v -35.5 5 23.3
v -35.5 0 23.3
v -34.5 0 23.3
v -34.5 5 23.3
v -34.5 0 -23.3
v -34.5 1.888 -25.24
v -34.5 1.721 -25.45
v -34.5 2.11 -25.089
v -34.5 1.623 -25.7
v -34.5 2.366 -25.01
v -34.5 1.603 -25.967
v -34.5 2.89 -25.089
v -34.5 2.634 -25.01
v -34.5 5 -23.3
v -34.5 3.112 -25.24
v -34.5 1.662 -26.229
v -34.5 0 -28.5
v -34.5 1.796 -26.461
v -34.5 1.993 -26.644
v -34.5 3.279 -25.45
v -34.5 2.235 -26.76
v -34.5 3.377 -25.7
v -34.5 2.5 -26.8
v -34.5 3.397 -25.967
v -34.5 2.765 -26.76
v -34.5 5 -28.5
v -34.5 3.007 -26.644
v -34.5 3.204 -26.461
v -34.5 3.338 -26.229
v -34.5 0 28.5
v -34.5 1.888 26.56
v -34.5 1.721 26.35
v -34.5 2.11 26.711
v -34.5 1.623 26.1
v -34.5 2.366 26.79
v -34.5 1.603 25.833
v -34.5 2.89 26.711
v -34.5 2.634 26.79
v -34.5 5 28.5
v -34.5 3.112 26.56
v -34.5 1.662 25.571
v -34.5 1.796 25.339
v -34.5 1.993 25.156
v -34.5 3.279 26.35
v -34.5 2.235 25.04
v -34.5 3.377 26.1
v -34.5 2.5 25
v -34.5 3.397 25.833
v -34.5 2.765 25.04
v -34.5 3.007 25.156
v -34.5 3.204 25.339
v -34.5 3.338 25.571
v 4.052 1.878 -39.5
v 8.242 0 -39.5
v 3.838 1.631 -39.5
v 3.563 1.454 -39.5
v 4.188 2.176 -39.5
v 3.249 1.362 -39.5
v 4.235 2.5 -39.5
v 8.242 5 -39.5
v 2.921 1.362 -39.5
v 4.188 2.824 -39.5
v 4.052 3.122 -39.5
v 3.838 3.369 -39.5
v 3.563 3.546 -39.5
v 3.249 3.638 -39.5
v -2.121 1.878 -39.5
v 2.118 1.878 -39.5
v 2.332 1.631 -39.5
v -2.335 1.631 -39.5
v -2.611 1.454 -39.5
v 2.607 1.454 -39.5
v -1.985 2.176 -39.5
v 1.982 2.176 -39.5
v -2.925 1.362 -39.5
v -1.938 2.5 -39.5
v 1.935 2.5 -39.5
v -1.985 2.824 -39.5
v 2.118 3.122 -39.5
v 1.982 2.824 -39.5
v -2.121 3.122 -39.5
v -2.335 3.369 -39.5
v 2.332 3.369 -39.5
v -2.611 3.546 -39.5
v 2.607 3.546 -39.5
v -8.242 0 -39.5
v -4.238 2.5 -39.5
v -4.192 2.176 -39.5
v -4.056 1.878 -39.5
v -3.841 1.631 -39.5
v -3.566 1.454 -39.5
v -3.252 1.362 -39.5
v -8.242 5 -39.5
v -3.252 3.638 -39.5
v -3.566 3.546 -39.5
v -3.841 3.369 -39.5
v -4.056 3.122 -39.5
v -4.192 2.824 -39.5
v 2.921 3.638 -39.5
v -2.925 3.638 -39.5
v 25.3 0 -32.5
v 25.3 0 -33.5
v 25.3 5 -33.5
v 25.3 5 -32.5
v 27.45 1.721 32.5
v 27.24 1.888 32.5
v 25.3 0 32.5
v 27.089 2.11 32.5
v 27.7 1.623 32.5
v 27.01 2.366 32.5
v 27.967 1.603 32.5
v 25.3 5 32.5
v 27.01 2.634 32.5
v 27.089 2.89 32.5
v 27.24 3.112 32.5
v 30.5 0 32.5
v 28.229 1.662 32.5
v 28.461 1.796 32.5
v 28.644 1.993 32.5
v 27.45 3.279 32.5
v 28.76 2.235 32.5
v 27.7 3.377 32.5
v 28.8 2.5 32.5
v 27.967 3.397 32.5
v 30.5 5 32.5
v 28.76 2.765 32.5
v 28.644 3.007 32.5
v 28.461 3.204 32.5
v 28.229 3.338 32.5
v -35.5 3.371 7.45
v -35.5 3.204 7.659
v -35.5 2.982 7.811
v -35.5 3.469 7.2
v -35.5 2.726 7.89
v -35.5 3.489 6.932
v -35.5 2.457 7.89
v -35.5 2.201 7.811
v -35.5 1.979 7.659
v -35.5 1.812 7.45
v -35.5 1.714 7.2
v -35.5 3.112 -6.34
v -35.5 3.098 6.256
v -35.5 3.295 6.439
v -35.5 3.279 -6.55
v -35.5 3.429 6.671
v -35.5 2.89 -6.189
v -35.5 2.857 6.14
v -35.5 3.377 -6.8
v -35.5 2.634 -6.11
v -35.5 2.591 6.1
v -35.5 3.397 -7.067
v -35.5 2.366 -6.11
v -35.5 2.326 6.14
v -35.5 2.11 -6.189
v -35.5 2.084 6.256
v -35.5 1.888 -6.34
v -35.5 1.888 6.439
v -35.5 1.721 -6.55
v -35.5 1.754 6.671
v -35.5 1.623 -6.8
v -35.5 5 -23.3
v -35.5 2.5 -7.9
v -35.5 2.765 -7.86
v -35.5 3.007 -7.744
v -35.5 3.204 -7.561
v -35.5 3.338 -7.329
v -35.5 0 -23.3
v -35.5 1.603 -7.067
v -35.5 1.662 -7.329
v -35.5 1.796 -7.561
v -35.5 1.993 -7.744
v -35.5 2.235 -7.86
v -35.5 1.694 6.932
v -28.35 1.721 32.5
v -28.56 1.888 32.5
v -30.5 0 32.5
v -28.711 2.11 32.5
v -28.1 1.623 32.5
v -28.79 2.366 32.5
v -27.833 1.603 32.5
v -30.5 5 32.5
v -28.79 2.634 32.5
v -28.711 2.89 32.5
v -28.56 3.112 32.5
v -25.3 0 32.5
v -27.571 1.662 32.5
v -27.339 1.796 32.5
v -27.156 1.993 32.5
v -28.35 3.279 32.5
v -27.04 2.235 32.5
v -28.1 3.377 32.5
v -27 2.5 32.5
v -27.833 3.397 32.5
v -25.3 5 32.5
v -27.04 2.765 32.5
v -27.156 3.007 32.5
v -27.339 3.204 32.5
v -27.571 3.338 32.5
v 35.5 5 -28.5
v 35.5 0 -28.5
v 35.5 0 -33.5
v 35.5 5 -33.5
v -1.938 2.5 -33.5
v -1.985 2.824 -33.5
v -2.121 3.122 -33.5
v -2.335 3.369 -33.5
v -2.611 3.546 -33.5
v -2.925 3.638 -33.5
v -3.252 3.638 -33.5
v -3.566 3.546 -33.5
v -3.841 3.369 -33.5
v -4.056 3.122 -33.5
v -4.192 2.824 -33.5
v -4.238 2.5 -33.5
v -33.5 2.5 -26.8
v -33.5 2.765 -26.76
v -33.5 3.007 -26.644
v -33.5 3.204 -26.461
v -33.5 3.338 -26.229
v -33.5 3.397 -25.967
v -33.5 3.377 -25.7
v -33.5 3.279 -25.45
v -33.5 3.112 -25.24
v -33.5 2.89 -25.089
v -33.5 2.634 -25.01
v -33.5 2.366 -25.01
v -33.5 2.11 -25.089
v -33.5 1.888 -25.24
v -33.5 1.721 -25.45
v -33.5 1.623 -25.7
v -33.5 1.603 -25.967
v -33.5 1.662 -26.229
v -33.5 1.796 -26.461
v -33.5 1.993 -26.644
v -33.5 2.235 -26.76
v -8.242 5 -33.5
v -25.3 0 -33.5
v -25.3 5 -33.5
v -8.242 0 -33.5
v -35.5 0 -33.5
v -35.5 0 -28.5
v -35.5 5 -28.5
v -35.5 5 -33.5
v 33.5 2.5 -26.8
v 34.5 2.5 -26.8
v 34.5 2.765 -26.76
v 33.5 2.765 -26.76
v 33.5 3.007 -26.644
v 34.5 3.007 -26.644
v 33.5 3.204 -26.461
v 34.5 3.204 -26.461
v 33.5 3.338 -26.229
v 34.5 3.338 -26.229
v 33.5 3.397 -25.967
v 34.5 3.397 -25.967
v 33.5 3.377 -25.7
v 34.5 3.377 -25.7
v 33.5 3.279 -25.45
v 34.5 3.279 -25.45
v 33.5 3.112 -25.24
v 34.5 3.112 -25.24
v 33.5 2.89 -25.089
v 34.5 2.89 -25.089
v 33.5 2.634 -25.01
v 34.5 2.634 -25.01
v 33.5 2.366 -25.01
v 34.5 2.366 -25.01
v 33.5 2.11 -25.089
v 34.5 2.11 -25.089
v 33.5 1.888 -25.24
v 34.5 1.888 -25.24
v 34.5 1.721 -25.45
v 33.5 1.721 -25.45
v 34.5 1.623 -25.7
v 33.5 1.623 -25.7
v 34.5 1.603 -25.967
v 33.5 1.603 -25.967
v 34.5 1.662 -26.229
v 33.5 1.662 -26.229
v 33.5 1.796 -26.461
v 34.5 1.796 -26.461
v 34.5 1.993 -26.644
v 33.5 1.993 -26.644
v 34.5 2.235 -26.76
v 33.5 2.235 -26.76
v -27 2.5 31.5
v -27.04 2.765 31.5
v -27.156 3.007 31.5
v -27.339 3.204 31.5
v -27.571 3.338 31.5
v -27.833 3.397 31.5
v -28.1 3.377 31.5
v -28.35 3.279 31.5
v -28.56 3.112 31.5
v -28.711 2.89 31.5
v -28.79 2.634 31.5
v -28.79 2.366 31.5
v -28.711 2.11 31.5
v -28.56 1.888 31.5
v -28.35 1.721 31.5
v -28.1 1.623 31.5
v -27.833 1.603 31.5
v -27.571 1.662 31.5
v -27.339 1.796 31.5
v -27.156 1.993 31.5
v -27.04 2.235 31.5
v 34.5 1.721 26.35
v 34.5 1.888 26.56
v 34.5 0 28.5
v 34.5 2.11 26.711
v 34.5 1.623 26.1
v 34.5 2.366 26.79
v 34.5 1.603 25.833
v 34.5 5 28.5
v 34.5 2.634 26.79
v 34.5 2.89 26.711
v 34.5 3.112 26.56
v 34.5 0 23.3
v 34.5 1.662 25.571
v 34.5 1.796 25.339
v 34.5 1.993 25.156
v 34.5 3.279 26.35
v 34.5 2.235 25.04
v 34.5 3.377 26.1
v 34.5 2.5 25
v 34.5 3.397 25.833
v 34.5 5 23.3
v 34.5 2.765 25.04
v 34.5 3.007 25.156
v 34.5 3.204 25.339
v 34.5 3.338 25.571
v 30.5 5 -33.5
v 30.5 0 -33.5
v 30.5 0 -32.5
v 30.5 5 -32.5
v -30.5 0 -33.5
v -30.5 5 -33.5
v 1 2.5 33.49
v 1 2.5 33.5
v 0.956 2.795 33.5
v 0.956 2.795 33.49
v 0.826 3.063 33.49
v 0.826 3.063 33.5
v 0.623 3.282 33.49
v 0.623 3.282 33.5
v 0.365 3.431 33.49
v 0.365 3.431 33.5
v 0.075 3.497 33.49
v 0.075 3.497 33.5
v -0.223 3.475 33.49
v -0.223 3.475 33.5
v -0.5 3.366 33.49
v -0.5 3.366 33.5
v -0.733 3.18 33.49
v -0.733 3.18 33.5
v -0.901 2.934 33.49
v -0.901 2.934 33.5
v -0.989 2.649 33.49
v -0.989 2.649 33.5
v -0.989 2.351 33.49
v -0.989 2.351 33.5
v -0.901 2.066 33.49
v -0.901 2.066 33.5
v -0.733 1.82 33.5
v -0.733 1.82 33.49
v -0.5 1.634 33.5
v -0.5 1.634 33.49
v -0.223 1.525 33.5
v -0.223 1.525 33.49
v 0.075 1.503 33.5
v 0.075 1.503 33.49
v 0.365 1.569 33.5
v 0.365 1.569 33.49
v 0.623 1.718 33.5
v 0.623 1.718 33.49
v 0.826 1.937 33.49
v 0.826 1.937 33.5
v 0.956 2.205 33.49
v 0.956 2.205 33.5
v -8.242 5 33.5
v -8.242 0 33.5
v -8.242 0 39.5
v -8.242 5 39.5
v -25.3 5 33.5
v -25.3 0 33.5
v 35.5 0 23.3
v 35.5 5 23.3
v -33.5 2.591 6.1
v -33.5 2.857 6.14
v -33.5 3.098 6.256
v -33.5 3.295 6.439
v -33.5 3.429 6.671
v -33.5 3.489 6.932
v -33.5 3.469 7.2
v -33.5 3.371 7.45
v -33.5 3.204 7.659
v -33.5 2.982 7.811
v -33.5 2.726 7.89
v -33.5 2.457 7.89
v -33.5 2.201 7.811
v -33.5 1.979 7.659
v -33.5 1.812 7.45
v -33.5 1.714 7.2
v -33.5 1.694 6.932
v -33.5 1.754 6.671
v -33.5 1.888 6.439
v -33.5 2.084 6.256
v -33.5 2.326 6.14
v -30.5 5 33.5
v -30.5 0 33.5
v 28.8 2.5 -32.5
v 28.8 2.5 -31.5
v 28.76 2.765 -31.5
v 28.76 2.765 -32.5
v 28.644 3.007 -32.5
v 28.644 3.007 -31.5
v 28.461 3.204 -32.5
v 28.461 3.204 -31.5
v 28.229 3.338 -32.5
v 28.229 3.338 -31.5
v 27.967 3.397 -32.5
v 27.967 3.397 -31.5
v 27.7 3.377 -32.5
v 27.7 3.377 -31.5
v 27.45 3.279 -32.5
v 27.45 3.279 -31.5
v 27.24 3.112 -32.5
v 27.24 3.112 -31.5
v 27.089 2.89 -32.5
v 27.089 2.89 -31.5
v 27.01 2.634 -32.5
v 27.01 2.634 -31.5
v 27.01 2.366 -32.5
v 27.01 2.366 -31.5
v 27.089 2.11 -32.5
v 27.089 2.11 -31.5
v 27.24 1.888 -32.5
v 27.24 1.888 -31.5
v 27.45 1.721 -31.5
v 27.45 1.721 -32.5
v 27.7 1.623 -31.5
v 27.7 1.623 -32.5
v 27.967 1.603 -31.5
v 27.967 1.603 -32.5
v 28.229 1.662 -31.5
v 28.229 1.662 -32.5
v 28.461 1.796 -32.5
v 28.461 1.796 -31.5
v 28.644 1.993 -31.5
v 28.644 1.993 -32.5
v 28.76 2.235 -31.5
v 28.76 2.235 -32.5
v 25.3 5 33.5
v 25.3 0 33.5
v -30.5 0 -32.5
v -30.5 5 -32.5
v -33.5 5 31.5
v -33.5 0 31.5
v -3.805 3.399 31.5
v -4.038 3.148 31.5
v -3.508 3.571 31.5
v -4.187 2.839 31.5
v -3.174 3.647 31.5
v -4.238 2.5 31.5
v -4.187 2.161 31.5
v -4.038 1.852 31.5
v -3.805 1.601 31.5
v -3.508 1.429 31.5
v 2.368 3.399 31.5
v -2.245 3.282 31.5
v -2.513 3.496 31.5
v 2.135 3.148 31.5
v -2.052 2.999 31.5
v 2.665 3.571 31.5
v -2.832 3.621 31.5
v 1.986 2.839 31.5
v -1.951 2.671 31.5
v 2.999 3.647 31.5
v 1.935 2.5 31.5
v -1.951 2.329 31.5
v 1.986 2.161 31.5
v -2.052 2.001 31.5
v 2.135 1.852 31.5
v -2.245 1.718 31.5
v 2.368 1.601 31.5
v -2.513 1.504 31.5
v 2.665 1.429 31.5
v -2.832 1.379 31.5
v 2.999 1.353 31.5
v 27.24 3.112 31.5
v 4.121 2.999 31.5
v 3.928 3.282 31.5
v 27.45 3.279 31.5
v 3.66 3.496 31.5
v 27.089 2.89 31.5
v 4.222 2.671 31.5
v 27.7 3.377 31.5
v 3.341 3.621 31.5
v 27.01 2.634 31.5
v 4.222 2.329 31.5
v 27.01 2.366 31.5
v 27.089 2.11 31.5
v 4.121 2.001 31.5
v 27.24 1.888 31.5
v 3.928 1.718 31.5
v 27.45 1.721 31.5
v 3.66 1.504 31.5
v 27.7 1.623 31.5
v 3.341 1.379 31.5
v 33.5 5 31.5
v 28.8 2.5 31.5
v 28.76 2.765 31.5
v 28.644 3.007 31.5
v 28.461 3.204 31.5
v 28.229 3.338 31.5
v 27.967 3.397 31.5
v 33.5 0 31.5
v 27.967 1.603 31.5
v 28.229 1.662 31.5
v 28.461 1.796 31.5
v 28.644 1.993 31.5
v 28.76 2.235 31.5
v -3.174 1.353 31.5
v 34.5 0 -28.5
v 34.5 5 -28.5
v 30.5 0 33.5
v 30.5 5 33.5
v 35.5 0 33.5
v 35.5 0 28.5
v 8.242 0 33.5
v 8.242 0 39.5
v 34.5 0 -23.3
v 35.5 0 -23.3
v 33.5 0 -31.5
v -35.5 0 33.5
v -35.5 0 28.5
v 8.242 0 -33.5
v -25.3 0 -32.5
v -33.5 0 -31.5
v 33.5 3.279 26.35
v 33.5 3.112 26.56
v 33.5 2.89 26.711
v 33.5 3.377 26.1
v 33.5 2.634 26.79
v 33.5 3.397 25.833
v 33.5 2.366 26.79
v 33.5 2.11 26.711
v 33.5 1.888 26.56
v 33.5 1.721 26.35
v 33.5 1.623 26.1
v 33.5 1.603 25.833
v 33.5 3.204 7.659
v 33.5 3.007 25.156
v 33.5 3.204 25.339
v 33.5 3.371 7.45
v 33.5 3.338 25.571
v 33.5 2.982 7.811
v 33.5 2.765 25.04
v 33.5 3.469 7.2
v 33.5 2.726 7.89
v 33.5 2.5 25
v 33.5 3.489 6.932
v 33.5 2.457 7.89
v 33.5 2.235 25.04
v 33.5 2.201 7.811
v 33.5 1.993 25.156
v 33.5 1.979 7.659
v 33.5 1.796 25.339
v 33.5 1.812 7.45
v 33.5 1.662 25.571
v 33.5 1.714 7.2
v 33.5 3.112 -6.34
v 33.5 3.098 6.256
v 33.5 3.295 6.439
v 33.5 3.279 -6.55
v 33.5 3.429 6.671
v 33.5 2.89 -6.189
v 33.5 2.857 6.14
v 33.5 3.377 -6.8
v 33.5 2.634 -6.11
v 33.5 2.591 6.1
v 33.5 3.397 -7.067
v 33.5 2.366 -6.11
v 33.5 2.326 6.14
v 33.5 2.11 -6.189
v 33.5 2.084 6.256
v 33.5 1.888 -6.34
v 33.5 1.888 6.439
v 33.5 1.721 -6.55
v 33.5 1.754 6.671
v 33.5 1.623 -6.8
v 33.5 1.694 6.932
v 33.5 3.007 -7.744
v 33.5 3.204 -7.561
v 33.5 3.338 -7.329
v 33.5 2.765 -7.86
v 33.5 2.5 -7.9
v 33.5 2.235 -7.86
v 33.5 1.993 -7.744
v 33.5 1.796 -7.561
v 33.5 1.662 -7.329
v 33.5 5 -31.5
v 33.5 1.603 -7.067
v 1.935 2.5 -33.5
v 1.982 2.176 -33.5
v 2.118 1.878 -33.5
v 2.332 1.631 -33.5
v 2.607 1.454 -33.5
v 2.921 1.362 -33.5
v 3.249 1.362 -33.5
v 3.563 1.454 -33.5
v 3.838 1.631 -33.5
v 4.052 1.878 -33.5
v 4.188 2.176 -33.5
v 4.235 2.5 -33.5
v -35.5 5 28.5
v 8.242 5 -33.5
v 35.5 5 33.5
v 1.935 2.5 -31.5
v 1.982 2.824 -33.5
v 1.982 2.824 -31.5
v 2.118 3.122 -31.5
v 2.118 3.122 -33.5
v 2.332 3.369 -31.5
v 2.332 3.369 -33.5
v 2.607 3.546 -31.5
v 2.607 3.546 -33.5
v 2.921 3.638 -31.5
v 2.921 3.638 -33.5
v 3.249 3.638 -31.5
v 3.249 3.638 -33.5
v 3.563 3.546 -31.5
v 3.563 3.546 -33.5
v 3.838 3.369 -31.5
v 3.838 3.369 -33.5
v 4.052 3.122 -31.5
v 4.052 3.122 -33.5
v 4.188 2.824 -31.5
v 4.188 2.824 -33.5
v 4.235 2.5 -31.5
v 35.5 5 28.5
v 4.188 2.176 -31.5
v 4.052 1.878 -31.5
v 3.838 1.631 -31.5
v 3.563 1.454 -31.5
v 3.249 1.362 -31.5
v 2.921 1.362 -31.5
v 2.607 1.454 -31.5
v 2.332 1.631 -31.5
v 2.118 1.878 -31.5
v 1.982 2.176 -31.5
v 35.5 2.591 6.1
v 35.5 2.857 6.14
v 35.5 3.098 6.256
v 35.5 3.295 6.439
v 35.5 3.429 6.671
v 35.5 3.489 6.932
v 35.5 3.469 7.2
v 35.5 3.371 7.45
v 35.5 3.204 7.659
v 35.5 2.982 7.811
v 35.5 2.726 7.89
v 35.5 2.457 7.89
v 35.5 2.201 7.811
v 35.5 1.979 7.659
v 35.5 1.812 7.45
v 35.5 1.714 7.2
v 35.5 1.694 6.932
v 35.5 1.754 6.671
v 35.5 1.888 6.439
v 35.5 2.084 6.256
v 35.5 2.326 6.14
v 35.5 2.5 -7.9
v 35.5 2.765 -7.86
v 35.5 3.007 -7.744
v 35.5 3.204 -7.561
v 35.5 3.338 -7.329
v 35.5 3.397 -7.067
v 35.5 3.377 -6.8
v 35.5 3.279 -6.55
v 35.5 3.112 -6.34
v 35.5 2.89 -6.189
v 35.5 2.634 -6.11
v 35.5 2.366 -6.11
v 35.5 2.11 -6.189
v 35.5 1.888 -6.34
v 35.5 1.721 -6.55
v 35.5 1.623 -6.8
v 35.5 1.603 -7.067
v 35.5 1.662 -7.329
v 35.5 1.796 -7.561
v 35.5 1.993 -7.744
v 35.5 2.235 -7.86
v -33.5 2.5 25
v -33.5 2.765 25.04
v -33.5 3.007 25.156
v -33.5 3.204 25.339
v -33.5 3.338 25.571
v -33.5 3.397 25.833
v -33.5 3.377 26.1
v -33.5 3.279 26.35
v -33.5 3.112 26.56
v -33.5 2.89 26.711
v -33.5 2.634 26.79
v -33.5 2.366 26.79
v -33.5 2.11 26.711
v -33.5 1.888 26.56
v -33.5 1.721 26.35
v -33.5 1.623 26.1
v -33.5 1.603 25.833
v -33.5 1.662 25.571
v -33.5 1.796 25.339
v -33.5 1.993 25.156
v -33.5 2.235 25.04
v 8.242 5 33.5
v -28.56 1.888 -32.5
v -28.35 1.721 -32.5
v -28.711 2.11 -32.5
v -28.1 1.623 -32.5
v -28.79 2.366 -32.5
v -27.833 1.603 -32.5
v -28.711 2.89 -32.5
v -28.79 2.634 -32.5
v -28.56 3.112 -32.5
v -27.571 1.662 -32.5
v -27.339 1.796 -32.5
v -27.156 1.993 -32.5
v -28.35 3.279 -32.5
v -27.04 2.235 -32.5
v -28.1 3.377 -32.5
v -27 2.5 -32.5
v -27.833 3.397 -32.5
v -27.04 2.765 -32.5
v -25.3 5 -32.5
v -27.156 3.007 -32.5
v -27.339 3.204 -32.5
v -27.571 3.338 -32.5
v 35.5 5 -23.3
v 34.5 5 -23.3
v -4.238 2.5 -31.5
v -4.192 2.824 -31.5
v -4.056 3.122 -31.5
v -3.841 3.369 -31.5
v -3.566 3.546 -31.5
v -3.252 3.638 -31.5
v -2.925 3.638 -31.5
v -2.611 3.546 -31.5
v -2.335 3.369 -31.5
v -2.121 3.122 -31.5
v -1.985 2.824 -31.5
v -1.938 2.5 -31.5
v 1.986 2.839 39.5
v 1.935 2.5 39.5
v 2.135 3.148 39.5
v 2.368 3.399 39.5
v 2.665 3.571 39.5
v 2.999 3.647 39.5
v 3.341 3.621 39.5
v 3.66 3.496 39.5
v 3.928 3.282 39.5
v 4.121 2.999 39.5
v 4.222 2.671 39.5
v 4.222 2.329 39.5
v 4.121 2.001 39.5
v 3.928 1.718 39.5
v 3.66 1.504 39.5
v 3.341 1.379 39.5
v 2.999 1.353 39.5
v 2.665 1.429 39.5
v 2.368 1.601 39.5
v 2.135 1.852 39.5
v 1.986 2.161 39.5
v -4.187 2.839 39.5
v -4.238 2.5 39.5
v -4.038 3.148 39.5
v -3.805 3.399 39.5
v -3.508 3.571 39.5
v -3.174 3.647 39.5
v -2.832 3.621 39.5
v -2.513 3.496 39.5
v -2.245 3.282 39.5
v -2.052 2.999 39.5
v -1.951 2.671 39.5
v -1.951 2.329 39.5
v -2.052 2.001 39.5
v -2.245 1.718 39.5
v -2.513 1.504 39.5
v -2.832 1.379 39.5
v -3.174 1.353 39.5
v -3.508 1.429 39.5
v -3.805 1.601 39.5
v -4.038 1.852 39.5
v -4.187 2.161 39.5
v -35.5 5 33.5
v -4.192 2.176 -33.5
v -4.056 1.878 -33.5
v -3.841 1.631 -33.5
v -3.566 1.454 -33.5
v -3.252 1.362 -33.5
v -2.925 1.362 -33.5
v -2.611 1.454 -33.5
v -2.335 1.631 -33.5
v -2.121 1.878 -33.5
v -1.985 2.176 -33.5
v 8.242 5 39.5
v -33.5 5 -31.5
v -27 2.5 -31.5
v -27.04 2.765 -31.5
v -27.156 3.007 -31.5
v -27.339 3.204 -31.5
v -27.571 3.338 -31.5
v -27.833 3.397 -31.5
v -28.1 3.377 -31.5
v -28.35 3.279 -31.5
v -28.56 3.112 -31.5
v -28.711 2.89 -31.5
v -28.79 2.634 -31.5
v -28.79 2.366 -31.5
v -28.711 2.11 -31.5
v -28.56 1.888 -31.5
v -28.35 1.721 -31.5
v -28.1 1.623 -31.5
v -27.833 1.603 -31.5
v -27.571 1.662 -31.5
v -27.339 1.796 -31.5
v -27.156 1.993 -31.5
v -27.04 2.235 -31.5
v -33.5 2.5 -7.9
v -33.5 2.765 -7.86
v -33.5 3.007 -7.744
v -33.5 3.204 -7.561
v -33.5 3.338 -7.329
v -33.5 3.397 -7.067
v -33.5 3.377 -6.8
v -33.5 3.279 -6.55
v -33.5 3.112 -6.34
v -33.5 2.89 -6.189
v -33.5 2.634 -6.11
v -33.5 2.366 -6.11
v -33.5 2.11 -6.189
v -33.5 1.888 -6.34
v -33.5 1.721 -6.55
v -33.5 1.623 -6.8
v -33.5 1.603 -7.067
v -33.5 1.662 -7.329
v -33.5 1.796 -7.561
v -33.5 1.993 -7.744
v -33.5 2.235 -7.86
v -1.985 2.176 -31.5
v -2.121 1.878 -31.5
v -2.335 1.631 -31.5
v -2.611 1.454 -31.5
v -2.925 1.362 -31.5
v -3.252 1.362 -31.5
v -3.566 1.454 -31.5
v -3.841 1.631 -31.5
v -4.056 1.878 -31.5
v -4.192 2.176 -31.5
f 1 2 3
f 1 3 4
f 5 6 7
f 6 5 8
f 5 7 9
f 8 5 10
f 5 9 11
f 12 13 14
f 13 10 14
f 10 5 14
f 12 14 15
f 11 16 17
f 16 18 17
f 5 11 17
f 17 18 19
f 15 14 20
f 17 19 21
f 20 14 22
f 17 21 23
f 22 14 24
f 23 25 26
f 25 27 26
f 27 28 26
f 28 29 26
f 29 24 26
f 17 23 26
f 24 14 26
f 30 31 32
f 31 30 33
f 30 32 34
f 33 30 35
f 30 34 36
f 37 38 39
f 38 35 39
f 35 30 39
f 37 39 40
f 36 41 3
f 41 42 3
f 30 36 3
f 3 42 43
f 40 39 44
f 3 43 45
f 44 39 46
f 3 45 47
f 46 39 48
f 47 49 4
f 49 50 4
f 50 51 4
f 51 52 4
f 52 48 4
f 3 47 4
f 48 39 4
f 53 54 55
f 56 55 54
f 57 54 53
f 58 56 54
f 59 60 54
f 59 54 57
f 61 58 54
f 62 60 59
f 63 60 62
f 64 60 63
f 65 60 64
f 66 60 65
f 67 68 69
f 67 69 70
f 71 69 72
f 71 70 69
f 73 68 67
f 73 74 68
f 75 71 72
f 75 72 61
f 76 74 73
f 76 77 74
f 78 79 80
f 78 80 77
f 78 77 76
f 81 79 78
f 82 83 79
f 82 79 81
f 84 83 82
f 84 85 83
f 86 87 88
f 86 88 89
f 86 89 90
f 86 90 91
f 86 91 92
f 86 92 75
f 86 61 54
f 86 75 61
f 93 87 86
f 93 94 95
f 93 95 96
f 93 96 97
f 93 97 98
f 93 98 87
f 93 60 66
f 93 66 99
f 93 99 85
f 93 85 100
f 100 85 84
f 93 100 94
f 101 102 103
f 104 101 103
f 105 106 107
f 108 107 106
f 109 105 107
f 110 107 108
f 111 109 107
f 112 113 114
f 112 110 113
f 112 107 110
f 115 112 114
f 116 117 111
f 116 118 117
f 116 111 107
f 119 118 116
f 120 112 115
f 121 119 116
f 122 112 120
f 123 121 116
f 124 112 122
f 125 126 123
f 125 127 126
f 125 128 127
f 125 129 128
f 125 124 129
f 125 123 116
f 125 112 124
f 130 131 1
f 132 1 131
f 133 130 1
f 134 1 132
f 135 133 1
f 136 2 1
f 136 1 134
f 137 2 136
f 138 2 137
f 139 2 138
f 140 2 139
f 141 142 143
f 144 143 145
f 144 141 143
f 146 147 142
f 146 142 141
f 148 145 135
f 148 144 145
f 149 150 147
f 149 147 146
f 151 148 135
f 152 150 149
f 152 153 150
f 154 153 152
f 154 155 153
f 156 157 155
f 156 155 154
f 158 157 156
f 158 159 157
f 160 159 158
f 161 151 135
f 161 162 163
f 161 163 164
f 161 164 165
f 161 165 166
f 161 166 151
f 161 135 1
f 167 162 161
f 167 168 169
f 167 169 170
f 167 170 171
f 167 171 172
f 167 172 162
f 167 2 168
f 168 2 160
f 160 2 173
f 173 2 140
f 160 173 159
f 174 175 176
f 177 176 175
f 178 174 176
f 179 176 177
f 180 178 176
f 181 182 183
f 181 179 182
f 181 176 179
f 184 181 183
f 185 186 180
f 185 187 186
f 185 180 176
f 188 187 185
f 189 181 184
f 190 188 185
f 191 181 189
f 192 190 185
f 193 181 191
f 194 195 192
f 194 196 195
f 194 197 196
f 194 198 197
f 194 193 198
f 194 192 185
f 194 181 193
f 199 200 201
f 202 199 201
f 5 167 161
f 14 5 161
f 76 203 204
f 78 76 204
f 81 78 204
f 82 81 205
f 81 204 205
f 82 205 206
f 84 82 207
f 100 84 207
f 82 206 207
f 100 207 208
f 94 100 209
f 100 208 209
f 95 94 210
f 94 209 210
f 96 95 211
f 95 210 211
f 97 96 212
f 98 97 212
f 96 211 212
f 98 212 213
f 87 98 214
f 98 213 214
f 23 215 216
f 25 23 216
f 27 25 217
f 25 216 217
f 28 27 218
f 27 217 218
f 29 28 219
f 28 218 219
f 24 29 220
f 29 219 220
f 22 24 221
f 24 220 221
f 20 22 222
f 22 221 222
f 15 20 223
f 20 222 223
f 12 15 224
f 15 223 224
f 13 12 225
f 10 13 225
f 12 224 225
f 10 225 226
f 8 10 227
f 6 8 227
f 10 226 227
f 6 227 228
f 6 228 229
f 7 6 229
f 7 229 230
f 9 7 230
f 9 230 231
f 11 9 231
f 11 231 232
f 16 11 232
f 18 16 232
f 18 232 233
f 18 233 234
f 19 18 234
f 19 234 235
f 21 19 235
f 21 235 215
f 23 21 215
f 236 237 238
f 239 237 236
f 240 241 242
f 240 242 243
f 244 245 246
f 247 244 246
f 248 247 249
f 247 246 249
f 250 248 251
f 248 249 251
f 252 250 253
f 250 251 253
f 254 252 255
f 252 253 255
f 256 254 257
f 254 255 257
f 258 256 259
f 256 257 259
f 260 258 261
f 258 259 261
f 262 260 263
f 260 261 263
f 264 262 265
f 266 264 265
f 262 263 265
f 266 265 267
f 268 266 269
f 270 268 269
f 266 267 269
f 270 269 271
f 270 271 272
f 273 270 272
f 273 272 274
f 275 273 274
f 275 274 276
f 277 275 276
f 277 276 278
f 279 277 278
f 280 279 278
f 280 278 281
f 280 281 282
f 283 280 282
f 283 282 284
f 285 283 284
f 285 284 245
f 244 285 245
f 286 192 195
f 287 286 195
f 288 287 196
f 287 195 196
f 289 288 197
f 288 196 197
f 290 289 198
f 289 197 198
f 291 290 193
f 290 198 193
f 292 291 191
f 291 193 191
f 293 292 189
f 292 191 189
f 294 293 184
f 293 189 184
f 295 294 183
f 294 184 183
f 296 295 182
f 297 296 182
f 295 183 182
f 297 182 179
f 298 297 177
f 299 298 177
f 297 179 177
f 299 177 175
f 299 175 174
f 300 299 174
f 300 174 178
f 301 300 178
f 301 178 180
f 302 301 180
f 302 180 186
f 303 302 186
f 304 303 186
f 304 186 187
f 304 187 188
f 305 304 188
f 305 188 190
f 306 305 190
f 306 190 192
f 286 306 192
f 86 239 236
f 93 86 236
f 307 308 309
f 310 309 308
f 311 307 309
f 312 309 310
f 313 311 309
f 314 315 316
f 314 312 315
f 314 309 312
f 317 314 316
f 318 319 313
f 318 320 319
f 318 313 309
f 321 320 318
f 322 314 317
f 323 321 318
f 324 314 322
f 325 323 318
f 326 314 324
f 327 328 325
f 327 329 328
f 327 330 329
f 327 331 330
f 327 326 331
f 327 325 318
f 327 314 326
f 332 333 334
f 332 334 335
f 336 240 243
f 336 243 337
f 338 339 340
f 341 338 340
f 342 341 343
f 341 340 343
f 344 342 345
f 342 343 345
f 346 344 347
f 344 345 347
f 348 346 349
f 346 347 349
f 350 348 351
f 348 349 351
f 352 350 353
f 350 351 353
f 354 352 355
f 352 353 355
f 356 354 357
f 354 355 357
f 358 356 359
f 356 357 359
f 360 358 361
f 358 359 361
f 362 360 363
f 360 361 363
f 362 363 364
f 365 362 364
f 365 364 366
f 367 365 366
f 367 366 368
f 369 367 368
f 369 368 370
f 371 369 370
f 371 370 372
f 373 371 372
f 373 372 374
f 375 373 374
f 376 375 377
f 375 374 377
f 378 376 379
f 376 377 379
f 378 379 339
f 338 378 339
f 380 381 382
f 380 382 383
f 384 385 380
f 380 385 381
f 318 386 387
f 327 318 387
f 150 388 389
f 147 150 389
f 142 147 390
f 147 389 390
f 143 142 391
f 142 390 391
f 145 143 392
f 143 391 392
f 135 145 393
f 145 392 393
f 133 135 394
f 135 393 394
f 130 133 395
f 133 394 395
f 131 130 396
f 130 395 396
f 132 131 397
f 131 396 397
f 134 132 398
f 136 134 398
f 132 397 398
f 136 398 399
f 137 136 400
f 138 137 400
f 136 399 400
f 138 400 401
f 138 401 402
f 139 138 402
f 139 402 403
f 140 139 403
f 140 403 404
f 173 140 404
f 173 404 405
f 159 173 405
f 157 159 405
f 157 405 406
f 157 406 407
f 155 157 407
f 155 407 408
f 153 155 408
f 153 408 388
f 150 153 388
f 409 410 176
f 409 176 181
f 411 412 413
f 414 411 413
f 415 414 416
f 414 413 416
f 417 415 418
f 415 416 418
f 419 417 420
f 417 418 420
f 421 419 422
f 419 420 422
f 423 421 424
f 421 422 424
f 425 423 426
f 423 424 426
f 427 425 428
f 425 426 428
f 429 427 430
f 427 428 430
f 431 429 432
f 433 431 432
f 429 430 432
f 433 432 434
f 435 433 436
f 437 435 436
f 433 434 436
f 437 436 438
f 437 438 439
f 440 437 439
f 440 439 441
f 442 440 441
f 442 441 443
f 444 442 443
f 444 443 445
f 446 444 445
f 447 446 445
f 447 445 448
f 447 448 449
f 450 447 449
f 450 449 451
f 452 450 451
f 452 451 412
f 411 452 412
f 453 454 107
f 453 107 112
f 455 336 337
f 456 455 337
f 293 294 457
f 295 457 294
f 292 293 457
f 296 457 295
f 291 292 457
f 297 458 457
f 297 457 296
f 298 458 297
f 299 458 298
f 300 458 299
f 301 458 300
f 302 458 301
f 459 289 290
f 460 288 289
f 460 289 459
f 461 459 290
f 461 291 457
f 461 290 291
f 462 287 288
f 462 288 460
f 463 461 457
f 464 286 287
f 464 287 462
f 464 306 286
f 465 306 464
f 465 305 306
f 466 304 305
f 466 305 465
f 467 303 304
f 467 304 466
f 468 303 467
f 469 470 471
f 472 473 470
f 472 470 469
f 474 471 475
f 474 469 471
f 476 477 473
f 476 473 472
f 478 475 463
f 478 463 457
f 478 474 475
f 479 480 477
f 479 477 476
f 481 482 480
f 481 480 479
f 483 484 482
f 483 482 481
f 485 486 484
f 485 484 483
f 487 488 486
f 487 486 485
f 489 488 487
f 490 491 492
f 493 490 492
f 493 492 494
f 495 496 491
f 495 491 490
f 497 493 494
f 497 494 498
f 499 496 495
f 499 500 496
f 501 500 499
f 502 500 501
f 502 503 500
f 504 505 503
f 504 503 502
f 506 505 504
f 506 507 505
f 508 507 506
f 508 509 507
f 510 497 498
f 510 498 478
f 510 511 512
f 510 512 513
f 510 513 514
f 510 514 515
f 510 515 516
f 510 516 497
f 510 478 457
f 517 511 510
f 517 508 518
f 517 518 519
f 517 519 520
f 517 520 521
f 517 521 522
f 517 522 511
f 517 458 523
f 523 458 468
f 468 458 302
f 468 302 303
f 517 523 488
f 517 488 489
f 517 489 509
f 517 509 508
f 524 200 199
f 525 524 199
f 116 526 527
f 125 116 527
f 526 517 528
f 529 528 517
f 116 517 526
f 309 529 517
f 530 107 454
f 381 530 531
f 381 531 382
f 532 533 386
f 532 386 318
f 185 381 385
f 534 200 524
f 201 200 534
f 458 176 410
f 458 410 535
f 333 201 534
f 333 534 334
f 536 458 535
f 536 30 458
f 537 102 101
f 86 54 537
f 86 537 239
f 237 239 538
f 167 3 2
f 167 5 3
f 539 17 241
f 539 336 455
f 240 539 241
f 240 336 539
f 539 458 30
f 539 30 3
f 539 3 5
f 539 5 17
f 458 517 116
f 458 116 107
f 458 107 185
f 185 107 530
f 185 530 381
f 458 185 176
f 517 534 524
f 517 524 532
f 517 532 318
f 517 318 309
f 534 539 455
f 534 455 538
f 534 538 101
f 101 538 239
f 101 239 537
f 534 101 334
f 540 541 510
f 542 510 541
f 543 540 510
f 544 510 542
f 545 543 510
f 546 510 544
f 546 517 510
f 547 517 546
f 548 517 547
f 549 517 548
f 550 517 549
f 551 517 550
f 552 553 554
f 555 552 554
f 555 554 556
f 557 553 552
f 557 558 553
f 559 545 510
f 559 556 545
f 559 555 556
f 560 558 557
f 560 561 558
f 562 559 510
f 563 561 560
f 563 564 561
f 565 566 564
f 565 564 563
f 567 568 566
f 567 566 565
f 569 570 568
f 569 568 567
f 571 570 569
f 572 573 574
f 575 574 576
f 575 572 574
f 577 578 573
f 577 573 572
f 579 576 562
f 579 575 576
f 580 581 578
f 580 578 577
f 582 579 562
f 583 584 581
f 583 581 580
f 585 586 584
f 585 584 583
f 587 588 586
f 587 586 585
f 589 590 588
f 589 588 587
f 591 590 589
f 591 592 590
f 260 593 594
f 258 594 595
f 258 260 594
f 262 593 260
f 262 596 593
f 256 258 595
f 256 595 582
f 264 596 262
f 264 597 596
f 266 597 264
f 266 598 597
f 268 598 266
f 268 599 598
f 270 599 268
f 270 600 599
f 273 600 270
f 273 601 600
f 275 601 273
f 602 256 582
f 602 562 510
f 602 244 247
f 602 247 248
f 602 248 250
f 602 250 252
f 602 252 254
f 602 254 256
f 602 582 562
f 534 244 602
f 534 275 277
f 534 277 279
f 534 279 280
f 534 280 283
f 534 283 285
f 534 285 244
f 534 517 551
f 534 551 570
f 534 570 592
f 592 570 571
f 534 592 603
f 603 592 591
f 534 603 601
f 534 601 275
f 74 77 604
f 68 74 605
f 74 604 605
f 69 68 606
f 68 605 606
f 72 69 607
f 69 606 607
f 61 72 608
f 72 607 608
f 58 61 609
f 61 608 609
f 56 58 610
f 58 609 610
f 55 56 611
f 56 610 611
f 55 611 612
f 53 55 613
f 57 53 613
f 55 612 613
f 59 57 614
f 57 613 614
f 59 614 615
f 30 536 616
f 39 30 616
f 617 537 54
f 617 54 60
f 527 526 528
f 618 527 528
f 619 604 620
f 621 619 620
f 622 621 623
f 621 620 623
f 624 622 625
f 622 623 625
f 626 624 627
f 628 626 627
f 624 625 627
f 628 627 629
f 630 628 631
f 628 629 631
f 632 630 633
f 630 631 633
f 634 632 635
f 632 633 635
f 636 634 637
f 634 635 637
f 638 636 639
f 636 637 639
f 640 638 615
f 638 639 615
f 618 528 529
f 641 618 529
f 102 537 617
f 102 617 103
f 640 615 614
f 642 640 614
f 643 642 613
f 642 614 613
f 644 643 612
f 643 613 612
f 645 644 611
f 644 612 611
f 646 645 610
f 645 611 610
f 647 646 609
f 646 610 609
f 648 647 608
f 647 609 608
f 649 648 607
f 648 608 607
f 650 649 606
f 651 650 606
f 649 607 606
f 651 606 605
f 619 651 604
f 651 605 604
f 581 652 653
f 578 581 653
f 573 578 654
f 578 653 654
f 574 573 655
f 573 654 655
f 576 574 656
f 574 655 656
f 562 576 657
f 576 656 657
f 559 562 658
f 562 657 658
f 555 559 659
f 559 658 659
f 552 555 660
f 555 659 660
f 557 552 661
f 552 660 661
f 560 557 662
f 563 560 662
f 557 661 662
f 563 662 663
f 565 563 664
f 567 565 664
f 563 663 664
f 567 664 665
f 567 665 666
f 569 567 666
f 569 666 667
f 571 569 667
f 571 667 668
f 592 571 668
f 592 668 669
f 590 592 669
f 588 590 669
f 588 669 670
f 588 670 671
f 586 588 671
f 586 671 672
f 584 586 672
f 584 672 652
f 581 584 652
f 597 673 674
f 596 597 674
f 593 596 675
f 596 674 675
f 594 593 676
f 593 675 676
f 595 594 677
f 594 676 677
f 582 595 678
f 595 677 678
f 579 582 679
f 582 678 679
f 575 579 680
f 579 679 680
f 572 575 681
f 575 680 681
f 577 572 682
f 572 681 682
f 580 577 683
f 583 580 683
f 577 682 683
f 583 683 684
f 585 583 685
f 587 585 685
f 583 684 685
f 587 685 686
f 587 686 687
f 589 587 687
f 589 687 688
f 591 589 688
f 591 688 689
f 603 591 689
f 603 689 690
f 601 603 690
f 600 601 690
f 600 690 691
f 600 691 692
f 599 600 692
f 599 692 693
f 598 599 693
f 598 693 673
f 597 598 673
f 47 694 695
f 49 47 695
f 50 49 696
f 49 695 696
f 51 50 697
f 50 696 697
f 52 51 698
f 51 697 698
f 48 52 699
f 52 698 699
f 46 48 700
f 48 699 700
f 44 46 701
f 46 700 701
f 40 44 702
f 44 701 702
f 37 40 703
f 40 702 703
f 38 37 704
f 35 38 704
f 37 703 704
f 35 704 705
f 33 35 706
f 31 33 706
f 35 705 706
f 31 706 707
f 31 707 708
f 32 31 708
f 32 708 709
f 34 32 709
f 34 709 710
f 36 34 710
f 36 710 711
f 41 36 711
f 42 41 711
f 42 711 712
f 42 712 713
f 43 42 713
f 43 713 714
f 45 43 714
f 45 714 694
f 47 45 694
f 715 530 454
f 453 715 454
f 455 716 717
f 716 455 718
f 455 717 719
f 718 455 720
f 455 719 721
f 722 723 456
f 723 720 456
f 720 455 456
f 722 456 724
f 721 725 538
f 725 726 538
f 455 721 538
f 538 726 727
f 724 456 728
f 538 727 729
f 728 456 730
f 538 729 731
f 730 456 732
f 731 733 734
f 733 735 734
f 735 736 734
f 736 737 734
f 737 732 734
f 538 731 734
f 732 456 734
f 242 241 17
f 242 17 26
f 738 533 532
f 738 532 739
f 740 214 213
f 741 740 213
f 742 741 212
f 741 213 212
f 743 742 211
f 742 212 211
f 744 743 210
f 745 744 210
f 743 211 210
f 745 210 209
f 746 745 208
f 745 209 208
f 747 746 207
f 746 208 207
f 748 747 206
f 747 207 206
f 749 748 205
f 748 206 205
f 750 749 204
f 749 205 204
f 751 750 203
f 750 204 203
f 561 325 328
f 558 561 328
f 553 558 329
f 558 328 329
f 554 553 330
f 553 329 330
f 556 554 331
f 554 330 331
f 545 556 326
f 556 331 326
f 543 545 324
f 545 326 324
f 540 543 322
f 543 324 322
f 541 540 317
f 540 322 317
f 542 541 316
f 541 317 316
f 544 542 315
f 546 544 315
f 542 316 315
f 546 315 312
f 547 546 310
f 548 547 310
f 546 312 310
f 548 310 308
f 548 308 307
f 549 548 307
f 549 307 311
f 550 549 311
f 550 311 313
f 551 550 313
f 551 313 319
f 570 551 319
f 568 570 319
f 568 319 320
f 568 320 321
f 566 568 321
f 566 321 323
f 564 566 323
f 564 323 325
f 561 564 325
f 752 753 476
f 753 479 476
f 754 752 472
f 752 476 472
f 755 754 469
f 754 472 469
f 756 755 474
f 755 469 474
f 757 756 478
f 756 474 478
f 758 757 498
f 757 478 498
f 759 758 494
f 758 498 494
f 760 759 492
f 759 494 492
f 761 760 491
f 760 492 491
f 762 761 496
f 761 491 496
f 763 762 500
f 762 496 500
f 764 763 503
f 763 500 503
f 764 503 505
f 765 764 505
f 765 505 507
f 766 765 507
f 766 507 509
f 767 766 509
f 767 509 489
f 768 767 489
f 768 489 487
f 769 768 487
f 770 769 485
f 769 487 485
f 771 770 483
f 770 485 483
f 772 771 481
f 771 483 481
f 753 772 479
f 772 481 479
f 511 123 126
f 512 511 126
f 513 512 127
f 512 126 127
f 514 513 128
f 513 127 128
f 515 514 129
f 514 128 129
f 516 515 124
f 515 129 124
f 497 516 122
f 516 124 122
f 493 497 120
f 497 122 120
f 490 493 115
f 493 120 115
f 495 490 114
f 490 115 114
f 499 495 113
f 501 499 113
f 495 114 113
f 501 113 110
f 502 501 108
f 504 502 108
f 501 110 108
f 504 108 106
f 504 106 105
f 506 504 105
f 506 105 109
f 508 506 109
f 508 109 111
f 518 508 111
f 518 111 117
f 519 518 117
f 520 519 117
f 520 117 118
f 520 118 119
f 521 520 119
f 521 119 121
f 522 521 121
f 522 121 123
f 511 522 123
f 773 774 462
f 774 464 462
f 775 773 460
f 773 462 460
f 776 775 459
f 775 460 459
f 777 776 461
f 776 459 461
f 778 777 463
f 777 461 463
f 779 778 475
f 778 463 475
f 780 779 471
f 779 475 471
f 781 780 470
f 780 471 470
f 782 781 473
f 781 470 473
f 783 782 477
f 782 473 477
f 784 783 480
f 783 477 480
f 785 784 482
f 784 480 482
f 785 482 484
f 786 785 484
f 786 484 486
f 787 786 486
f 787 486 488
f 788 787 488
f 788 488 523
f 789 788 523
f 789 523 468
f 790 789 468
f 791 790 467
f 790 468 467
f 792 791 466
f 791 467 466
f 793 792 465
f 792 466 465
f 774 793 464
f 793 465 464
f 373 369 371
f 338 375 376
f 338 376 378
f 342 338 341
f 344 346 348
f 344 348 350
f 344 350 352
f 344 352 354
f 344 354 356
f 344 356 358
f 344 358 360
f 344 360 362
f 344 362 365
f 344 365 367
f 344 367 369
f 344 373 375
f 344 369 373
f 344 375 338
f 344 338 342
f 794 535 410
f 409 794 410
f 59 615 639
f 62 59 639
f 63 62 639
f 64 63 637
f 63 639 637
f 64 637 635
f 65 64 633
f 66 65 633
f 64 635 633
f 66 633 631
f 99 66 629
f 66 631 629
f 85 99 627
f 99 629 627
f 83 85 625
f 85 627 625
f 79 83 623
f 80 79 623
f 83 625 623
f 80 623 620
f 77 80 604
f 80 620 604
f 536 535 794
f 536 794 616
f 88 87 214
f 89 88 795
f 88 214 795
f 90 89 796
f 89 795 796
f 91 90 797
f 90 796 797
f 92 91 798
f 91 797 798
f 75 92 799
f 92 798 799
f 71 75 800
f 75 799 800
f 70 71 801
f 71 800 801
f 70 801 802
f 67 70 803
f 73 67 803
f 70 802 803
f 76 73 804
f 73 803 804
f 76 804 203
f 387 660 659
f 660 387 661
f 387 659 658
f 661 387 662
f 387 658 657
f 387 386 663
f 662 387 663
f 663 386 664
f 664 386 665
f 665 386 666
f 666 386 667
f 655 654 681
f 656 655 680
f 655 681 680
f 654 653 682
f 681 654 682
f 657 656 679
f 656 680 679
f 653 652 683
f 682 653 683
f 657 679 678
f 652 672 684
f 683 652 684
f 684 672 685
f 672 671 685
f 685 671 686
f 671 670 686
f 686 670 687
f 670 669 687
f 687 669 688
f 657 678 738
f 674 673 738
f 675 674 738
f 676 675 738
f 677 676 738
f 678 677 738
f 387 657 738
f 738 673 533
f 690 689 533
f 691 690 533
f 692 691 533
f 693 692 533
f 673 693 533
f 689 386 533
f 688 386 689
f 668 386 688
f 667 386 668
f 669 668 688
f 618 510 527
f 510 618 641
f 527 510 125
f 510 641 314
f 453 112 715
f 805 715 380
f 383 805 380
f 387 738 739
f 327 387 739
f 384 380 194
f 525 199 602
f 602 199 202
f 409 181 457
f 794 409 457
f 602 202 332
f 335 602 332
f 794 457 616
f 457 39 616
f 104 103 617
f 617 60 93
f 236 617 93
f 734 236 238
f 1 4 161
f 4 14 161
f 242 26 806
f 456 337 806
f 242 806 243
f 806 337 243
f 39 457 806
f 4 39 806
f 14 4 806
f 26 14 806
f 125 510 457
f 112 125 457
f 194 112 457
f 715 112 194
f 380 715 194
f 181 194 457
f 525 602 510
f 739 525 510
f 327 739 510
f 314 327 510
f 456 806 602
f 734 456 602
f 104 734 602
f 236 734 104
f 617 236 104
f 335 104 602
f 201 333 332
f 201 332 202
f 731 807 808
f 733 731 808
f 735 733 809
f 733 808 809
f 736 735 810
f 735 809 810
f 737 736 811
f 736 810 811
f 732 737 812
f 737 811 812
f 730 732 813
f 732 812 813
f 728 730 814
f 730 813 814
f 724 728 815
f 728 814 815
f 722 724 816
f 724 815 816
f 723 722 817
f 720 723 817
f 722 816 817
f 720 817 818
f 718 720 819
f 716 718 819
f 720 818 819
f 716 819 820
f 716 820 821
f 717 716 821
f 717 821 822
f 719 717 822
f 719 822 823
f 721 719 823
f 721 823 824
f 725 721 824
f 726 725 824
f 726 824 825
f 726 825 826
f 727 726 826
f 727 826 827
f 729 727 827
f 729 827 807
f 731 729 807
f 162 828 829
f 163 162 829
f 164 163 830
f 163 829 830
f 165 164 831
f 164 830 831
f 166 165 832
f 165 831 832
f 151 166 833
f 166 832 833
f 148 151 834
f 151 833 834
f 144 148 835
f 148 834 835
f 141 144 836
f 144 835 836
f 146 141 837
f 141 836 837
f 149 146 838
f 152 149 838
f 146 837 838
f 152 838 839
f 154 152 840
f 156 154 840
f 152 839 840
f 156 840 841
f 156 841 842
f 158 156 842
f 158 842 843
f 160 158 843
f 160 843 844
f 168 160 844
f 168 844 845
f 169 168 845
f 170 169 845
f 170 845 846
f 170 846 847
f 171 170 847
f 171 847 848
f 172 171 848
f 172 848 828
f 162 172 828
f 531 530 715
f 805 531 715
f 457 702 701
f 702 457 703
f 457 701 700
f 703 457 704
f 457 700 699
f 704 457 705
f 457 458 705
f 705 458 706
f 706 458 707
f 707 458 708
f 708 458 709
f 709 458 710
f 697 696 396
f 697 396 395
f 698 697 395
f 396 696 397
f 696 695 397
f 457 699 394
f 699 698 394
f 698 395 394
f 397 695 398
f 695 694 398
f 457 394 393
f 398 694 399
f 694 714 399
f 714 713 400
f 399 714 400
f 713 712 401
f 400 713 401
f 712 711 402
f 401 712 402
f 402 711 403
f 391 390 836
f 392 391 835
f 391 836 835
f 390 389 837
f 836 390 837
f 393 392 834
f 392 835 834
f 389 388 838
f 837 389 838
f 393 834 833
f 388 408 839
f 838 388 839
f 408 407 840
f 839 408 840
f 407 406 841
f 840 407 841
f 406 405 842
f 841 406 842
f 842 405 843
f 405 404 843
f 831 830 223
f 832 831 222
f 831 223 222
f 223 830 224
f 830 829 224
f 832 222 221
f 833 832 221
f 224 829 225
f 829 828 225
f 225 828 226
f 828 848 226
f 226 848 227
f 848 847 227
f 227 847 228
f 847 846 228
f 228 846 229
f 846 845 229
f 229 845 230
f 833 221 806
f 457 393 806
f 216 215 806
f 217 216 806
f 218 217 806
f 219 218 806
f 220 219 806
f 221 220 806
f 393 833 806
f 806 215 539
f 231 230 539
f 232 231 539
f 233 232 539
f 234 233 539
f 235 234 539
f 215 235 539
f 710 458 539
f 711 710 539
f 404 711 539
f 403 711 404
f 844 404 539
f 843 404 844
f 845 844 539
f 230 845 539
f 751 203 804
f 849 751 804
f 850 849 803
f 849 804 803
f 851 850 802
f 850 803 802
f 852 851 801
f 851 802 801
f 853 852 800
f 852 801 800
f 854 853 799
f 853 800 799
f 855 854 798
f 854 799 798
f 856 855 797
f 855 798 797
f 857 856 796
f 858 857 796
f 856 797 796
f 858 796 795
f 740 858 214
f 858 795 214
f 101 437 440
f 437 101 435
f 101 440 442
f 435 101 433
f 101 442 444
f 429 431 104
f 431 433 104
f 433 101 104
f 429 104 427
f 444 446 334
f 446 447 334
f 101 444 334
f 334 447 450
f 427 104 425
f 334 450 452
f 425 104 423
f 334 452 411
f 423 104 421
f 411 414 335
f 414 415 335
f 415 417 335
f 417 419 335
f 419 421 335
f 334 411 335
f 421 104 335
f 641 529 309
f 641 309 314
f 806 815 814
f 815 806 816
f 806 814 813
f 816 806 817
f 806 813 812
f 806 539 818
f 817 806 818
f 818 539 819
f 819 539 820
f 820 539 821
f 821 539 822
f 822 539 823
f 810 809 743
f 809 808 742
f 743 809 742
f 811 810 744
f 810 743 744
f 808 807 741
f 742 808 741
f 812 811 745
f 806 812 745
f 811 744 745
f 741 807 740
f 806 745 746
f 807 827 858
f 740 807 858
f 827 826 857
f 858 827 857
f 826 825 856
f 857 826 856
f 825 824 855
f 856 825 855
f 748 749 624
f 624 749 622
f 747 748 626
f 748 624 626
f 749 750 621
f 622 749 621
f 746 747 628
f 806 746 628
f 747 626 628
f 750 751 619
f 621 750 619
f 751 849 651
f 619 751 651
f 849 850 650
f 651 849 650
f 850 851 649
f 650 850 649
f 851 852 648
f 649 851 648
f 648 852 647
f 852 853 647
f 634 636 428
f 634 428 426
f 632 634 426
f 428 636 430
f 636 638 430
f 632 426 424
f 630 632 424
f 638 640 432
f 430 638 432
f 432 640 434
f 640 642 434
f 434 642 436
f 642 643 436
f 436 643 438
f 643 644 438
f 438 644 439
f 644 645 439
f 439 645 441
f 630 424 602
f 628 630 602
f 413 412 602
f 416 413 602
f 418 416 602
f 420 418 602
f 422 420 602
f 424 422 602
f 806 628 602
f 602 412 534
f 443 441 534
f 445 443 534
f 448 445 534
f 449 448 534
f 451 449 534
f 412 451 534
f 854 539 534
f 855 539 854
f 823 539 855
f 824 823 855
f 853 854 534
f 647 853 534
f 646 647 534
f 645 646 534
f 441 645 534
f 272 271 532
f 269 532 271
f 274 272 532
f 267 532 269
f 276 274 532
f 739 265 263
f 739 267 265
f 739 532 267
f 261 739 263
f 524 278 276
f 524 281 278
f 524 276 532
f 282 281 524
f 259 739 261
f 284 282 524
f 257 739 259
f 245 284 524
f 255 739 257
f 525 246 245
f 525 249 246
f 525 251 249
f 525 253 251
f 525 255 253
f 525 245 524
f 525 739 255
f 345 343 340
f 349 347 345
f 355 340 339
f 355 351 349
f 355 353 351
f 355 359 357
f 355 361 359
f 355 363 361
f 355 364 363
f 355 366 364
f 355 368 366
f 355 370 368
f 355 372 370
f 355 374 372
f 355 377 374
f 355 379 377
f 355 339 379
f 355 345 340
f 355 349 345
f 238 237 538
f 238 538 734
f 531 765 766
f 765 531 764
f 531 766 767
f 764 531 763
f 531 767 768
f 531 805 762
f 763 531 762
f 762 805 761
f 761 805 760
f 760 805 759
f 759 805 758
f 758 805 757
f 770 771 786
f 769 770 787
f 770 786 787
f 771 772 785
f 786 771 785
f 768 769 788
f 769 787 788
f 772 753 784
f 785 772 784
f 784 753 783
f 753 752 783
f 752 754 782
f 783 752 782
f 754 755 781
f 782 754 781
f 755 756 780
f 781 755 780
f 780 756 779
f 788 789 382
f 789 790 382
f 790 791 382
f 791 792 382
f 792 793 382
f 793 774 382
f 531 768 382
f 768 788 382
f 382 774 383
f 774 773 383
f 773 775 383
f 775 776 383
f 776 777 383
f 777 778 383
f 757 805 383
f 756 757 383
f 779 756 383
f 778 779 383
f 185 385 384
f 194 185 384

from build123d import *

# Parameters (mm, degrees)
SKETCH1_W           = 71
SKETCH1_H           = 67
SKETCH1_W_2         = 67
SKETCH1_H_2         = 63
BOSS_EXTRUDE1_DEPTH = 5
SKETCH2_R           = 0.9
CUT_EXTRUDE1_DEPTH  = 121
SKETCH3_R           = 1
CUT_EXTRUDE2_DEPTH  = 0.01
SKETCH9_W           = 5.2
SKETCH9_H           = 5
CUT_EXTRUDE6_DEPTH  = 1
SKETCH10_W          = 5.2
SKETCH10_H          = 5
CUT_EXTRUDE7_DEPTH  = 1
SKETCH11_R          = 0.9
CUT_EXTRUDE8_DEPTH  = 81
SKETCH12_R          = 0.9
CUT_EXTRUDE9_DEPTH  = 81
SKETCH14_R          = 1.15
CUT_EXTRUDE10_DEPTH = 79
SKETCH15_W          = 16.483338106
SKETCH15_H          = 5
BOSS_EXTRUDE2_DEPTH = 6
SKETCH16_R          = 1.15
CUT_EXTRUDE11_DEPTH = 30
SKETCH17_R          = 1.15
CUT_EXTRUDE12_DEPTH = 30


with BuildPart() as part:
    # Sketch1 → Boss-Extrude1 (new body)
    with BuildSketch(Plane(origin=(0, 0, 0), x_dir=(1, 0, 0), z_dir=(0, 1, 0))):
        Rectangle(SKETCH1_W, SKETCH1_H)
        Rectangle(SKETCH1_W_2, SKETCH1_H_2, mode=Mode.SUBTRACT)
    extrude(amount=BOSS_EXTRUDE1_DEPTH)

    # Sketch2 → Cut-Extrude1 (cut)
    with BuildSketch(Plane(origin=(35.5, 0, 0), x_dir=(0, 0, -1), z_dir=(1, 0, 0))):
        with Locations((-6.999701476, 2.591425228)):
            Circle(SKETCH2_R)
        with Locations((7, 2.5)):
            Circle(SKETCH2_R)
    extrude(amount=-CUT_EXTRUDE1_DEPTH, mode=Mode.SUBTRACT)

    # Sketch3 → Cut-Extrude2 (cut)
    with BuildSketch(Plane.XY.offset(33.5)):
        with Locations((0, 2.5)):
            Circle(SKETCH3_R)
    extrude(amount=-CUT_EXTRUDE2_DEPTH, mode=Mode.SUBTRACT)

    # Sketch9 → Cut-Extrude6 (cut)
    with BuildSketch(Plane.XY.offset(33.5)):
        with Locations((-27.9, 2.5)):
            Rectangle(SKETCH9_W, SKETCH9_H)
        with Locations((27.9, 2.5)):
            Rectangle(SKETCH9_W, SKETCH9_H)
    cut_extrude6 = extrude(amount=-CUT_EXTRUDE6_DEPTH, mode=Mode.SUBTRACT)

    # Sketch10 → Cut-Extrude7 (cut)
    with BuildSketch(Plane(origin=(35.5, 0, 0), x_dir=(0, 0, -1), z_dir=(1, 0, 0))):
        with Locations((-25.9, 2.5)):
            Rectangle(SKETCH10_W, SKETCH10_H)
        with Locations((25.9, 2.5)):
            Rectangle(SKETCH10_W, SKETCH10_H)
    cut_extrude7 = extrude(amount=-CUT_EXTRUDE7_DEPTH, mode=Mode.SUBTRACT)

    # Mirror2: Cut-Extrude7 across plane
    add(cut_extrude7.mirror(Plane(origin=(0, 0, 0), x_dir=(0, 0, 1), z_dir=(1, 0, 0))), mode=Mode.SUBTRACT)

    # Mirror3: Cut-Extrude6 across plane
    add(cut_extrude6.mirror(Plane.XY), mode=Mode.SUBTRACT)

    # Sketch11 → Cut-Extrude8 (cut)
    with BuildSketch(Plane(origin=(34.5, 0, 0), x_dir=(0, 0, -1), z_dir=(1, 0, 0))):
        with Locations((25.9, 2.5)):
            Circle(SKETCH11_R)
        with Locations((-25.9, 2.5)):
            Circle(SKETCH11_R)
    extrude(amount=-CUT_EXTRUDE8_DEPTH, mode=Mode.SUBTRACT)

    # Sketch12 → Cut-Extrude9 (cut)
    with BuildSketch(Plane.XY.offset(32.5)):
        with Locations((27.9, 2.5)):
            Circle(SKETCH12_R)
        with Locations((-27.9, 2.5)):
            Circle(SKETCH12_R)
    extrude(amount=-CUT_EXTRUDE9_DEPTH, mode=Mode.SUBTRACT)

    # Sketch14 → Cut-Extrude10 (cut)
    with BuildSketch(Plane(origin=(0, 0, -33.5), x_dir=(-1, 0, 0), z_dir=(0, 0, -1))):
        with Locations((-3.085, 2.5)):
            Circle(SKETCH14_R)
        with Locations((3.088228318, 2.5)):
            Circle(SKETCH14_R)
    cut_extrude10 = extrude(amount=-CUT_EXTRUDE10_DEPTH, mode=Mode.SUBTRACT)

    # Sketch15 → Boss-Extrude2 (add)
    with BuildSketch(Plane(origin=(0, 0, -33.5), x_dir=(-1, 0, 0), z_dir=(0, 0, -1))):
        with Locations((0, 2.5)):
            Rectangle(SKETCH15_W, SKETCH15_H)
    boss_extrude2 = extrude(amount=BOSS_EXTRUDE2_DEPTH)

    # Sketch16 → Cut-Extrude11 (cut)
    with BuildSketch(Plane.XY.offset(-31.5)):
        with Locations((-3.088228318, 2.5)):
            Circle(SKETCH16_R)
        with Locations((3.085, 2.5)):
            Circle(SKETCH16_R)
    extrude(amount=-CUT_EXTRUDE11_DEPTH, mode=Mode.SUBTRACT)

    # Mirror4: Cut-Extrude10, Boss-Extrude2 across plane
    add(cut_extrude10.mirror(Plane.XY), mode=Mode.SUBTRACT)
    add(boss_extrude2.mirror(Plane.XY))

    # Sketch17 → Cut-Extrude12 (cut)
    with BuildSketch(Plane(origin=(0, 0, 31.5), x_dir=(-1, 0, 0), z_dir=(0, 0, -1))):
        with Locations((-3.085, 2.5)):
            Circle(SKETCH17_R)
        with Locations((3.088228318, 2.5)):
            Circle(SKETCH17_R)
    extrude(amount=-CUT_EXTRUDE12_DEPTH, mode=Mode.SUBTRACT)


solid = part.part
